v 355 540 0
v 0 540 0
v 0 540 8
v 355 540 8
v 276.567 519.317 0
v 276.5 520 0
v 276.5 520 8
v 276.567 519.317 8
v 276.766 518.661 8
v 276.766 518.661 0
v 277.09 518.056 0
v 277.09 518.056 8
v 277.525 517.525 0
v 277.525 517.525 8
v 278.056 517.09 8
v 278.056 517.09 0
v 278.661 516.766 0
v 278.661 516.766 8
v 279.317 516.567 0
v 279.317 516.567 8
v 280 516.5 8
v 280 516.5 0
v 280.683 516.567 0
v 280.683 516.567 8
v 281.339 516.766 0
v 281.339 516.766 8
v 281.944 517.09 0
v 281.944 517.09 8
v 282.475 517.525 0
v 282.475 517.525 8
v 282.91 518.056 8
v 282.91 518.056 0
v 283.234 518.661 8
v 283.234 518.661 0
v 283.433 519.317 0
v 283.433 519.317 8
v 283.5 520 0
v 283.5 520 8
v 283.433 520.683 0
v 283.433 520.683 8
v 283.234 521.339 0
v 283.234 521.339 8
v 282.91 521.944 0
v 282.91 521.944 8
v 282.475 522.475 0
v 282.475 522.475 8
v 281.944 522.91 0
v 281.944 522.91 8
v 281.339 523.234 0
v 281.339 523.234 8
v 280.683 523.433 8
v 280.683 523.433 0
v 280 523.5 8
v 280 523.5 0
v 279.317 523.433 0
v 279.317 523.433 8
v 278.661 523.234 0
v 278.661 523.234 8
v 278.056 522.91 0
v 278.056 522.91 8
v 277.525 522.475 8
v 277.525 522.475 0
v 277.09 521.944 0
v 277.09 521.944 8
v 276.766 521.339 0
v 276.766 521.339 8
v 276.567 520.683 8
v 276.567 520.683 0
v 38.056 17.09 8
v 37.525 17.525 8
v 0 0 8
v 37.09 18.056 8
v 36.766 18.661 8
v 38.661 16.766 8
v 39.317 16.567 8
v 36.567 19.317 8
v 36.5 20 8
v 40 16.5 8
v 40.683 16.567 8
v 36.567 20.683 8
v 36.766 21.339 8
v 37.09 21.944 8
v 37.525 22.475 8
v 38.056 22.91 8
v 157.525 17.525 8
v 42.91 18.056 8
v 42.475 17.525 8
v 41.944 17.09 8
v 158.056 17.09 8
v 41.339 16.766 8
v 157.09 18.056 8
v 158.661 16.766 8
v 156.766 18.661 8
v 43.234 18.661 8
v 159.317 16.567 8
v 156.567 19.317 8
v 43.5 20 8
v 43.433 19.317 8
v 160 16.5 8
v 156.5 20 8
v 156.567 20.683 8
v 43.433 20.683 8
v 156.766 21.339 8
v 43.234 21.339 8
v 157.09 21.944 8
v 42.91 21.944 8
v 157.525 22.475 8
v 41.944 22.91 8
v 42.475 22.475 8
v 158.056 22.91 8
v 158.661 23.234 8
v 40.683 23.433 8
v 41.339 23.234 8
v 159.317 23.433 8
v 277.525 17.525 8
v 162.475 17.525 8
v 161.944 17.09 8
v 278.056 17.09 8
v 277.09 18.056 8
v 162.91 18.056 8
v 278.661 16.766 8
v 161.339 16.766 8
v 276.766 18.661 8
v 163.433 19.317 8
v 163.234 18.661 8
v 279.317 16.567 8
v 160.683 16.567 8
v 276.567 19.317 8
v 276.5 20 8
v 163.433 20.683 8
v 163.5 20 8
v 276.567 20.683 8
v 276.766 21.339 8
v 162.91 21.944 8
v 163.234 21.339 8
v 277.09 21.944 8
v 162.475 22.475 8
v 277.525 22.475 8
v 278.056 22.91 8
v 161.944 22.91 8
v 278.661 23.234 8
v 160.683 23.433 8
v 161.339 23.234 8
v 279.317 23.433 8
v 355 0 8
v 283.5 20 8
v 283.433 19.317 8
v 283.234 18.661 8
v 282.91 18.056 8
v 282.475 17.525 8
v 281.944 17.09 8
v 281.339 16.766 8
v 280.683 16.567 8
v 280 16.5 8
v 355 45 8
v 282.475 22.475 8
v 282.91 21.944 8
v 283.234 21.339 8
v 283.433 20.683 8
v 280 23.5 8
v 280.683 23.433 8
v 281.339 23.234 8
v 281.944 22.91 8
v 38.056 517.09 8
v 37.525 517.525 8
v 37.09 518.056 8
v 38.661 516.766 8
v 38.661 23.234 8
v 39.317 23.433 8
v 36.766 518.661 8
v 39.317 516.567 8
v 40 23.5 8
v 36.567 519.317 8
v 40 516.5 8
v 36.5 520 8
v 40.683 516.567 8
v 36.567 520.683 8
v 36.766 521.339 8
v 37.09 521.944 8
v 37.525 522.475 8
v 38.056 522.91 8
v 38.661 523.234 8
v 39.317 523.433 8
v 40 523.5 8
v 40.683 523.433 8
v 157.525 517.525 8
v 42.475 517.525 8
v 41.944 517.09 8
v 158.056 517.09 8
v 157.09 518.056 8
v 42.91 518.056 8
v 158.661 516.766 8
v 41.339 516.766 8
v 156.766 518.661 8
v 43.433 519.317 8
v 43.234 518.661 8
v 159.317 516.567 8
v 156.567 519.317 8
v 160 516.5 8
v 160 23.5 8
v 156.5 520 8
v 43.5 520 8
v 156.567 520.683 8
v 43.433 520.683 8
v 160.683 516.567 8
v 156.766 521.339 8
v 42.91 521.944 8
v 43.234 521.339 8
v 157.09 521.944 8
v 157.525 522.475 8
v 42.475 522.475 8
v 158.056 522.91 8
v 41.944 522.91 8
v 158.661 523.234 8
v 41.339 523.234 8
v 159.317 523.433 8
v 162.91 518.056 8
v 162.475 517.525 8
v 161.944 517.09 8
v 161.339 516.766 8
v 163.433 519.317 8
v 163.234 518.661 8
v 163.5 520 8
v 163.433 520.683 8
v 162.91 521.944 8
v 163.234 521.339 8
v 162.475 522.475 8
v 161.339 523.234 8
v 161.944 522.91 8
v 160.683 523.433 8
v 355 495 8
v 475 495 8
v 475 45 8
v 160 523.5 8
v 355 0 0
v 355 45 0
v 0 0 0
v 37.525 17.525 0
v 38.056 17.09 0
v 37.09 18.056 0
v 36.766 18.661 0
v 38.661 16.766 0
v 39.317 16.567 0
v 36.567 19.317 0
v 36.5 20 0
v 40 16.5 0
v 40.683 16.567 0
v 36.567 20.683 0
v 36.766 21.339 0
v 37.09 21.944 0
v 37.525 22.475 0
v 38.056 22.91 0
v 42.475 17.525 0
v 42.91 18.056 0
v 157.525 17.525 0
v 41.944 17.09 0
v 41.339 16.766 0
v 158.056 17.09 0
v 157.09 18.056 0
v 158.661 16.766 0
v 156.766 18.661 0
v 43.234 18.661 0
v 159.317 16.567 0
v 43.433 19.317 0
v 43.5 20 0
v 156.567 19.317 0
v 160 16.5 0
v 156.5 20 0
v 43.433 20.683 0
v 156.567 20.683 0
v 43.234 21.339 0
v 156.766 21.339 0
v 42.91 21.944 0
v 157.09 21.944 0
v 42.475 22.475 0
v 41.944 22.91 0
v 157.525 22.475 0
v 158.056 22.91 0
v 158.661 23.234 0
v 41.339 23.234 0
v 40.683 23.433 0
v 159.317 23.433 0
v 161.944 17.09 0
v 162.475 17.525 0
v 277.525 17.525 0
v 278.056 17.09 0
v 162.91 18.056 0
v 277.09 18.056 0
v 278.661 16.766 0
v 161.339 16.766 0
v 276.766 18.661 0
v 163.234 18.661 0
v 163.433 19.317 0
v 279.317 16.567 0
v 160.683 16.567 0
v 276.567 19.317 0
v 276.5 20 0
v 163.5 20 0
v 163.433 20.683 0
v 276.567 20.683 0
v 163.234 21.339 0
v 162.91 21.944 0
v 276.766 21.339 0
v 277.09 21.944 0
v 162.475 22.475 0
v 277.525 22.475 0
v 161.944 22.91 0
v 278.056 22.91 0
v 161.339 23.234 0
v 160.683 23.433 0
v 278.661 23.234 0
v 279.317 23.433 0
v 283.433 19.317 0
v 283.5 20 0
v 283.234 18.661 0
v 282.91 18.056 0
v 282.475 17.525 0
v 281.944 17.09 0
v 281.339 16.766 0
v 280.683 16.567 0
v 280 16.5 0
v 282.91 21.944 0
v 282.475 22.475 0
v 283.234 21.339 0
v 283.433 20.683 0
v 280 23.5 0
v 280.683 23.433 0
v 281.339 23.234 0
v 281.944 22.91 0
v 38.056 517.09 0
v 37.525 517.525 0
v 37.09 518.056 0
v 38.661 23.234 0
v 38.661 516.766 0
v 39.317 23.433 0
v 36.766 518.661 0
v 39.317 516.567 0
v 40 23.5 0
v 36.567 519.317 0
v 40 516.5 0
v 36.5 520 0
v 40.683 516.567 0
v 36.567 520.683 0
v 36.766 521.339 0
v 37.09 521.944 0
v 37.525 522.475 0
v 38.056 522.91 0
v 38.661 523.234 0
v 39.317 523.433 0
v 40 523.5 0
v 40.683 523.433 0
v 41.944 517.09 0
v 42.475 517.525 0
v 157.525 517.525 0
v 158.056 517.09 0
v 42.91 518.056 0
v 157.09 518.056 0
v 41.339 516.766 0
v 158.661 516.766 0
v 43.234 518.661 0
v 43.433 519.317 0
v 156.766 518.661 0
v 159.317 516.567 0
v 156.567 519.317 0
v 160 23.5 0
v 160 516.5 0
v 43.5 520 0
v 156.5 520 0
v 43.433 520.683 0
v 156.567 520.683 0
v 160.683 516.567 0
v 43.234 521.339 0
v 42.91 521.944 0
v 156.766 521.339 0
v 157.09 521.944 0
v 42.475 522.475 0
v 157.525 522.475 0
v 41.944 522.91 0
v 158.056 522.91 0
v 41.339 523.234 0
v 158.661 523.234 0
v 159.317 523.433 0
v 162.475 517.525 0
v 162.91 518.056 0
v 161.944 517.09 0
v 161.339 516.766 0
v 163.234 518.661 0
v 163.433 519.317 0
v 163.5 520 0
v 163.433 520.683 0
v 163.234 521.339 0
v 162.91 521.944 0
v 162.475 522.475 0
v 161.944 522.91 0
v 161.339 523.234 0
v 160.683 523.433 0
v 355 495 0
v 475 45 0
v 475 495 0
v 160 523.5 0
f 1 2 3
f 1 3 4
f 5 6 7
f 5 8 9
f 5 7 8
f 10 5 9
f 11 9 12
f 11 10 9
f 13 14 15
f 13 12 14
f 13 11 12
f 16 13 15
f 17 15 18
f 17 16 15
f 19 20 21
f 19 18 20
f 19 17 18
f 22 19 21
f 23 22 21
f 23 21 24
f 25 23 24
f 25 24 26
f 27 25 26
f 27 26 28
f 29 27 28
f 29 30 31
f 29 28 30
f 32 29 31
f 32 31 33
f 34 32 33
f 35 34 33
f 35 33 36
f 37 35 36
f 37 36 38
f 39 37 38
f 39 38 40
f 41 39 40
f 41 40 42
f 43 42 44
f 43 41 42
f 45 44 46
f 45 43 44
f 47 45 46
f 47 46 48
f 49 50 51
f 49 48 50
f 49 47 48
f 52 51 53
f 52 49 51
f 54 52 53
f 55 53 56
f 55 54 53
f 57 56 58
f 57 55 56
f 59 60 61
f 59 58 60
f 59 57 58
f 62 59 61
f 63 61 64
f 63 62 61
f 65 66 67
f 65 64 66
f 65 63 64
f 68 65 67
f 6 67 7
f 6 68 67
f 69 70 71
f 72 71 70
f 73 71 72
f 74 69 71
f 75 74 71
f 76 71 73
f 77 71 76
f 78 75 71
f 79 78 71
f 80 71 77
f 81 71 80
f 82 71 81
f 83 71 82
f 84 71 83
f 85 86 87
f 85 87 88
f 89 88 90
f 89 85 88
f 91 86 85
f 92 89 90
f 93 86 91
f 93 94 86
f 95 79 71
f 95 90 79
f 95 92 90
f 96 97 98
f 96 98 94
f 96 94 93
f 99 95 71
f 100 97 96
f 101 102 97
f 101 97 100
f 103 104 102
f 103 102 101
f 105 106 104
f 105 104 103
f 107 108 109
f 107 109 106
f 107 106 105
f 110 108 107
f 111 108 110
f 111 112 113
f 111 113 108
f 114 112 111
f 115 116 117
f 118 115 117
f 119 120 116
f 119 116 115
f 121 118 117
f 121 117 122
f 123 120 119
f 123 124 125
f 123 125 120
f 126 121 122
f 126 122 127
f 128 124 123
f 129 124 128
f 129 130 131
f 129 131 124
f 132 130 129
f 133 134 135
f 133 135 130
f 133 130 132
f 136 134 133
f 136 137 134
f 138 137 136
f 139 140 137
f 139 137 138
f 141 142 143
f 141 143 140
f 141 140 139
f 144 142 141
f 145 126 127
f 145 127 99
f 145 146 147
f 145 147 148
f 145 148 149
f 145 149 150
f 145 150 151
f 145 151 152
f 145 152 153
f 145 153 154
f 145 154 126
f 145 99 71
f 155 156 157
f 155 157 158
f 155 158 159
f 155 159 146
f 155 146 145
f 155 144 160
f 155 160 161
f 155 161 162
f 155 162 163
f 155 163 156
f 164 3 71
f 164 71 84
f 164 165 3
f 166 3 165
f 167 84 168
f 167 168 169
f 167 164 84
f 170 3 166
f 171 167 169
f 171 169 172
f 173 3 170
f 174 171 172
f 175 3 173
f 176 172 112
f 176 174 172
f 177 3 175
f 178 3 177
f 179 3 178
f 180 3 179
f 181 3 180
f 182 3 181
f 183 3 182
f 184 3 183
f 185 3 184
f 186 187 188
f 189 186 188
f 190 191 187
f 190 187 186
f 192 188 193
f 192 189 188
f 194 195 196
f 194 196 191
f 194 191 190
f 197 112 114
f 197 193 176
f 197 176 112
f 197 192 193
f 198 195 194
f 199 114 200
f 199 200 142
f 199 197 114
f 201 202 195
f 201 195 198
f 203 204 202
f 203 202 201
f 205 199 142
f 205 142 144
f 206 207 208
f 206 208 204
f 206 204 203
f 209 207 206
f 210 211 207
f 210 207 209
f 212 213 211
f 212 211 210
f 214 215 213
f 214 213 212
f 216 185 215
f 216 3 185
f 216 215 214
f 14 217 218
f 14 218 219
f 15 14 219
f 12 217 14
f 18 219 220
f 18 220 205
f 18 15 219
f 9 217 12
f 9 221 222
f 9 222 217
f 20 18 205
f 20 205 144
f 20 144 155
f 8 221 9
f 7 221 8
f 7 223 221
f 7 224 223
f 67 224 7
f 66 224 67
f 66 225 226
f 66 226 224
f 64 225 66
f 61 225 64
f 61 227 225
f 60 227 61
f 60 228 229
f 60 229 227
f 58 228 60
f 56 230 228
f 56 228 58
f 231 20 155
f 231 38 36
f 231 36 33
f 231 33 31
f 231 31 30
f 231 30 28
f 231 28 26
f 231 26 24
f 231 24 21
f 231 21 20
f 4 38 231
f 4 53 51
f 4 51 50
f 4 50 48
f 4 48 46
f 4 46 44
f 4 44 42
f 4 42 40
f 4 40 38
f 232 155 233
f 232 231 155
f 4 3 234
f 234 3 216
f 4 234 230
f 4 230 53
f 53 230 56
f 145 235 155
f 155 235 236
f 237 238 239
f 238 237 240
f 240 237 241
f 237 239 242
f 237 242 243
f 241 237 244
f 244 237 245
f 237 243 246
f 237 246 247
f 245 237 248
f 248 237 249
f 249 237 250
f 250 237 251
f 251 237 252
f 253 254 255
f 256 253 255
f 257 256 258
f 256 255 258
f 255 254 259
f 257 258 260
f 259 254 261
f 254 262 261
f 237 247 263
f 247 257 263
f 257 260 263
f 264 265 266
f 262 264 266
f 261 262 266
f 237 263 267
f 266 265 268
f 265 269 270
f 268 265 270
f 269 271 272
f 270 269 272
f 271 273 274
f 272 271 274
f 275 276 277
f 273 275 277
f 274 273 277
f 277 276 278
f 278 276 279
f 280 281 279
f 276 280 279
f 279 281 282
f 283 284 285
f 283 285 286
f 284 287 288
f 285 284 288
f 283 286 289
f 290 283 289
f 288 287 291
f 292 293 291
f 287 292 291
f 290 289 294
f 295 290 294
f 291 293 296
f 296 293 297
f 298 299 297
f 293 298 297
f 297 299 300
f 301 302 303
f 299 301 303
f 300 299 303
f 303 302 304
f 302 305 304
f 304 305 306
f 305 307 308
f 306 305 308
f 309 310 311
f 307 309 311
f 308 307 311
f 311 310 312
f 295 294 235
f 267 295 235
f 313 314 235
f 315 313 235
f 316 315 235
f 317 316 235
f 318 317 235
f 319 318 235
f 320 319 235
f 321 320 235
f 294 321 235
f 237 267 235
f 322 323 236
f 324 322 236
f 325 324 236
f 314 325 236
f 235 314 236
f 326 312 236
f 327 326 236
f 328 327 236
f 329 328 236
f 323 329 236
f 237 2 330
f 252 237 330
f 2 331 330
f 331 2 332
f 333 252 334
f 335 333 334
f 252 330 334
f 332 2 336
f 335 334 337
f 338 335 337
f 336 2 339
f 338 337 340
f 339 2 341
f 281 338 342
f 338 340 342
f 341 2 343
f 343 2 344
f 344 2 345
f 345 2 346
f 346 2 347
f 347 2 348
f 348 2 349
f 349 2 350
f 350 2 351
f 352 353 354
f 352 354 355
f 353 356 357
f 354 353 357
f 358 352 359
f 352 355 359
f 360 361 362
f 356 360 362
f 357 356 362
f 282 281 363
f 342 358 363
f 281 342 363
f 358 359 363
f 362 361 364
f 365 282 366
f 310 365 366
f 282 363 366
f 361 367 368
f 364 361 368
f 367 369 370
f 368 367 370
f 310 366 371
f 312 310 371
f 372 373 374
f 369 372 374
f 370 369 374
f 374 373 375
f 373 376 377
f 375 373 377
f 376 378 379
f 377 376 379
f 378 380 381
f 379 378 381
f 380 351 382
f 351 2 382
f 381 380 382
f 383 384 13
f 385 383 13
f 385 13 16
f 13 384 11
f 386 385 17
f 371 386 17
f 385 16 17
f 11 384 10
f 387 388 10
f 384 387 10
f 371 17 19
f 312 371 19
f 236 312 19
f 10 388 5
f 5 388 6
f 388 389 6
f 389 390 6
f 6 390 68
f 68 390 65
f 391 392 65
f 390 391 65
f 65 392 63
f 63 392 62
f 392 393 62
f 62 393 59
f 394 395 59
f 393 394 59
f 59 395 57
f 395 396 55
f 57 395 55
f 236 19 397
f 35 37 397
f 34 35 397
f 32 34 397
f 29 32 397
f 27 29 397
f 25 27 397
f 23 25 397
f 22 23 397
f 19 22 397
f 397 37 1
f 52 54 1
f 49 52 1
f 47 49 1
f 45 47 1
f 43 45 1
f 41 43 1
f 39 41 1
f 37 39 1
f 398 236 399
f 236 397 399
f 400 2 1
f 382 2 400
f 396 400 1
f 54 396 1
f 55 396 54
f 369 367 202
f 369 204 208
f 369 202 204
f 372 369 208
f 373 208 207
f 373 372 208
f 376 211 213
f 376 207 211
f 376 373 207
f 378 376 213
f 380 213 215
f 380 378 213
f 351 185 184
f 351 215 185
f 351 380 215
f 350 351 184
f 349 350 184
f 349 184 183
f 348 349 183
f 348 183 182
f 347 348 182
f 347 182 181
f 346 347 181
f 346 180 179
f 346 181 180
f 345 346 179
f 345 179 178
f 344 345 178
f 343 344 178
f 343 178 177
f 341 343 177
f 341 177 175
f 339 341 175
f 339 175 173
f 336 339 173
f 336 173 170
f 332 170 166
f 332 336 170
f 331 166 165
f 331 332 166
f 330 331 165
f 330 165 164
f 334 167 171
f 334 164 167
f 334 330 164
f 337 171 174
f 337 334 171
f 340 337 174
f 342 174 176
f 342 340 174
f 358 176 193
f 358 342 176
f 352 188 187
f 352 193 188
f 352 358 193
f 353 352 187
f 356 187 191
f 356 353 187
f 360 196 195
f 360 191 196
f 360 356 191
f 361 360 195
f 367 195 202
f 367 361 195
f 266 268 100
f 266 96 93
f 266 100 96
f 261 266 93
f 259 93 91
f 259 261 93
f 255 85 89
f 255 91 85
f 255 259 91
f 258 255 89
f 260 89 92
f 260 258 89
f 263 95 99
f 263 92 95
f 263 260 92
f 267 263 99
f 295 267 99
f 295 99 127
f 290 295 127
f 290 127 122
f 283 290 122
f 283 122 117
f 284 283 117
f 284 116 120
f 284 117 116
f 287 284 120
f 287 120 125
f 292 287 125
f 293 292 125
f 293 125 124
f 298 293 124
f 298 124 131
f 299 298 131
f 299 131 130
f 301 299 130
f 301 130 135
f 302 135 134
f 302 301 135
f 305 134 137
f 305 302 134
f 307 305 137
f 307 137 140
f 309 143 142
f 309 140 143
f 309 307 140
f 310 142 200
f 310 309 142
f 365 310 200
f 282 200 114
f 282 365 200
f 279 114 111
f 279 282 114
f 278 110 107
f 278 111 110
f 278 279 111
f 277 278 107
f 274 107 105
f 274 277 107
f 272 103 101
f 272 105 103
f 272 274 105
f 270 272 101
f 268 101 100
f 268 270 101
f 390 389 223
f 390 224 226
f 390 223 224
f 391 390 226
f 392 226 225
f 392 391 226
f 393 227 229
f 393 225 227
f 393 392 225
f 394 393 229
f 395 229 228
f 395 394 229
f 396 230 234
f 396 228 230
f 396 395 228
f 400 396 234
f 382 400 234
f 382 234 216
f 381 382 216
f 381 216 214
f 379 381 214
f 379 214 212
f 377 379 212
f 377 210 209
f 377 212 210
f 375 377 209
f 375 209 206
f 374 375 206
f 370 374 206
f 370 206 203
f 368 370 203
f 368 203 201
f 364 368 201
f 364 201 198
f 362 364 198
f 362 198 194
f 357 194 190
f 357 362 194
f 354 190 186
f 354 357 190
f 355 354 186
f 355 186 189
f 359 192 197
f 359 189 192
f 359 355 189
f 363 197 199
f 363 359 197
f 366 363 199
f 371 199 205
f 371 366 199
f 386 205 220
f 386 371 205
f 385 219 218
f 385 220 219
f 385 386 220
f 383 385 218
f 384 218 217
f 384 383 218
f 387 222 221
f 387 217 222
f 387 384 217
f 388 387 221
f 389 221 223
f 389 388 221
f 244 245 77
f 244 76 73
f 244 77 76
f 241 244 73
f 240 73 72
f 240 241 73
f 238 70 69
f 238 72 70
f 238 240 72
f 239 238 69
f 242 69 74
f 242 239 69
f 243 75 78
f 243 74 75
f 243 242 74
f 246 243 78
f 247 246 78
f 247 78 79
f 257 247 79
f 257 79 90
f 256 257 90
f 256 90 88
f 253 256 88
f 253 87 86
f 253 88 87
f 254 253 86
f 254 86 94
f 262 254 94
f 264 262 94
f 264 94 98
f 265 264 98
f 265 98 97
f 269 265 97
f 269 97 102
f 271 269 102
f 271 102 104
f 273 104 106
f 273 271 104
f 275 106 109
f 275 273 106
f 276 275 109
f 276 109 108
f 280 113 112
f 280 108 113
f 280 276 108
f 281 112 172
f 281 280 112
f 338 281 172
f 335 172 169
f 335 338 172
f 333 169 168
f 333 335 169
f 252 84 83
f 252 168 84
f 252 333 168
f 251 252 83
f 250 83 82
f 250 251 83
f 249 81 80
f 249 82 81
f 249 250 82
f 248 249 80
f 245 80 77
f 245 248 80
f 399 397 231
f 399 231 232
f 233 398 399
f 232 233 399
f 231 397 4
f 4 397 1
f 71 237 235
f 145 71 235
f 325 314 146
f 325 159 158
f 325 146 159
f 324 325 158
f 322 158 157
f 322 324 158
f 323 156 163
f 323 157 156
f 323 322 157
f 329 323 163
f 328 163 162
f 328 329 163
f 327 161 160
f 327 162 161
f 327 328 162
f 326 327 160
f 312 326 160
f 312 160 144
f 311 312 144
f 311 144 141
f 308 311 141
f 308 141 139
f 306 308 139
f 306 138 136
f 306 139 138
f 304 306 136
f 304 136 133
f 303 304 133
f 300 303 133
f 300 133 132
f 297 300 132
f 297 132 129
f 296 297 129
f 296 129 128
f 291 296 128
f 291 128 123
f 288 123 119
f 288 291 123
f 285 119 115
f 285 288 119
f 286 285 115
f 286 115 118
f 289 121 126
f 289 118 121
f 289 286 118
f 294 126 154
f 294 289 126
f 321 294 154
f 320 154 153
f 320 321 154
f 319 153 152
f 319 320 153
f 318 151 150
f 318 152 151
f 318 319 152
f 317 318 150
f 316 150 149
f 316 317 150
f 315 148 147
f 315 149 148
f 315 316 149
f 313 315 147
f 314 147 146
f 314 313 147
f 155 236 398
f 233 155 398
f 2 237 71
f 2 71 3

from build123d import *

# Parameters (mm, degrees)
ESQUISSE1_W                  = 475
ESQUISSE1_H                  = 540
BOSS_EXTRU_1_DEPTH           = 8
ENL_V_MAT_EXTRU_1_DEPTH      = 720.228058407
ENL_V_MAT_EXTRU_1_DEPTH_BACK = 720.228058407
ESQUISSE2_R                  = 3.5
ENL_V_MAT_EXTRU_2_DEPTH      = 720.228058407
ENL_V_MAT_EXTRU_2_DEPTH_BACK = 720.228058407
ESQUISSE3_W                  = 120
ESQUISSE3_H                  = 45


with BuildPart() as part:
    # Esquisse1 → Boss.-Extru.1 (new body)
    with BuildSketch(Plane.XY):
        with Locations((237.5, 270)):
            Rectangle(ESQUISSE1_W, ESQUISSE1_H)
    extrude(amount=BOSS_EXTRU_1_DEPTH)

    # Esquisse2 → Enlèv. mat.-Extru.1 (cut, two sides: drawn at the far end of the back side and taken through both)
    with BuildSketch(Plane.XY.offset(8).offset(-ENL_V_MAT_EXTRU_1_DEPTH_BACK)):
        with Locations((160, 520)):
            Circle(ESQUISSE2_R)
        with Locations((40, 520)):
            Circle(ESQUISSE2_R)
        with Locations(Location((400, 520, 0), (0, 0, 180))):
            Circle(ESQUISSE2_R)
        with Locations(Location((280, 520, 0), (0, 0, 180))):
            Circle(ESQUISSE2_R)
        with Locations((280, 20)):
            Circle(ESQUISSE2_R)
        with Locations((400, 20)):
            Circle(ESQUISSE2_R)
        with Locations(Location((40, 20, 0), (0, 0, 180))):
            Circle(ESQUISSE2_R)
        with Locations(Location((160, 20, 0), (0, 0, 180))):
            Circle(ESQUISSE2_R)
    extrude(amount=ENL_V_MAT_EXTRU_1_DEPTH + ENL_V_MAT_EXTRU_1_DEPTH_BACK, mode=Mode.SUBTRACT)

    # Esquisse3 → Enlèv. mat.-Extru.2 (cut, two sides: drawn at the far end of the back side and taken through both)
    with BuildSketch(Plane.XY.offset(8).offset(-ENL_V_MAT_EXTRU_2_DEPTH_BACK)):
        with Locations((415, 517.5)):
            Rectangle(ESQUISSE3_W, ESQUISSE3_H)
        with Locations((415, 22.5)):
            Rectangle(ESQUISSE3_W, ESQUISSE3_H)
    extrude(amount=ENL_V_MAT_EXTRU_2_DEPTH + ENL_V_MAT_EXTRU_2_DEPTH_BACK, mode=Mode.SUBTRACT)


solid = part.part
